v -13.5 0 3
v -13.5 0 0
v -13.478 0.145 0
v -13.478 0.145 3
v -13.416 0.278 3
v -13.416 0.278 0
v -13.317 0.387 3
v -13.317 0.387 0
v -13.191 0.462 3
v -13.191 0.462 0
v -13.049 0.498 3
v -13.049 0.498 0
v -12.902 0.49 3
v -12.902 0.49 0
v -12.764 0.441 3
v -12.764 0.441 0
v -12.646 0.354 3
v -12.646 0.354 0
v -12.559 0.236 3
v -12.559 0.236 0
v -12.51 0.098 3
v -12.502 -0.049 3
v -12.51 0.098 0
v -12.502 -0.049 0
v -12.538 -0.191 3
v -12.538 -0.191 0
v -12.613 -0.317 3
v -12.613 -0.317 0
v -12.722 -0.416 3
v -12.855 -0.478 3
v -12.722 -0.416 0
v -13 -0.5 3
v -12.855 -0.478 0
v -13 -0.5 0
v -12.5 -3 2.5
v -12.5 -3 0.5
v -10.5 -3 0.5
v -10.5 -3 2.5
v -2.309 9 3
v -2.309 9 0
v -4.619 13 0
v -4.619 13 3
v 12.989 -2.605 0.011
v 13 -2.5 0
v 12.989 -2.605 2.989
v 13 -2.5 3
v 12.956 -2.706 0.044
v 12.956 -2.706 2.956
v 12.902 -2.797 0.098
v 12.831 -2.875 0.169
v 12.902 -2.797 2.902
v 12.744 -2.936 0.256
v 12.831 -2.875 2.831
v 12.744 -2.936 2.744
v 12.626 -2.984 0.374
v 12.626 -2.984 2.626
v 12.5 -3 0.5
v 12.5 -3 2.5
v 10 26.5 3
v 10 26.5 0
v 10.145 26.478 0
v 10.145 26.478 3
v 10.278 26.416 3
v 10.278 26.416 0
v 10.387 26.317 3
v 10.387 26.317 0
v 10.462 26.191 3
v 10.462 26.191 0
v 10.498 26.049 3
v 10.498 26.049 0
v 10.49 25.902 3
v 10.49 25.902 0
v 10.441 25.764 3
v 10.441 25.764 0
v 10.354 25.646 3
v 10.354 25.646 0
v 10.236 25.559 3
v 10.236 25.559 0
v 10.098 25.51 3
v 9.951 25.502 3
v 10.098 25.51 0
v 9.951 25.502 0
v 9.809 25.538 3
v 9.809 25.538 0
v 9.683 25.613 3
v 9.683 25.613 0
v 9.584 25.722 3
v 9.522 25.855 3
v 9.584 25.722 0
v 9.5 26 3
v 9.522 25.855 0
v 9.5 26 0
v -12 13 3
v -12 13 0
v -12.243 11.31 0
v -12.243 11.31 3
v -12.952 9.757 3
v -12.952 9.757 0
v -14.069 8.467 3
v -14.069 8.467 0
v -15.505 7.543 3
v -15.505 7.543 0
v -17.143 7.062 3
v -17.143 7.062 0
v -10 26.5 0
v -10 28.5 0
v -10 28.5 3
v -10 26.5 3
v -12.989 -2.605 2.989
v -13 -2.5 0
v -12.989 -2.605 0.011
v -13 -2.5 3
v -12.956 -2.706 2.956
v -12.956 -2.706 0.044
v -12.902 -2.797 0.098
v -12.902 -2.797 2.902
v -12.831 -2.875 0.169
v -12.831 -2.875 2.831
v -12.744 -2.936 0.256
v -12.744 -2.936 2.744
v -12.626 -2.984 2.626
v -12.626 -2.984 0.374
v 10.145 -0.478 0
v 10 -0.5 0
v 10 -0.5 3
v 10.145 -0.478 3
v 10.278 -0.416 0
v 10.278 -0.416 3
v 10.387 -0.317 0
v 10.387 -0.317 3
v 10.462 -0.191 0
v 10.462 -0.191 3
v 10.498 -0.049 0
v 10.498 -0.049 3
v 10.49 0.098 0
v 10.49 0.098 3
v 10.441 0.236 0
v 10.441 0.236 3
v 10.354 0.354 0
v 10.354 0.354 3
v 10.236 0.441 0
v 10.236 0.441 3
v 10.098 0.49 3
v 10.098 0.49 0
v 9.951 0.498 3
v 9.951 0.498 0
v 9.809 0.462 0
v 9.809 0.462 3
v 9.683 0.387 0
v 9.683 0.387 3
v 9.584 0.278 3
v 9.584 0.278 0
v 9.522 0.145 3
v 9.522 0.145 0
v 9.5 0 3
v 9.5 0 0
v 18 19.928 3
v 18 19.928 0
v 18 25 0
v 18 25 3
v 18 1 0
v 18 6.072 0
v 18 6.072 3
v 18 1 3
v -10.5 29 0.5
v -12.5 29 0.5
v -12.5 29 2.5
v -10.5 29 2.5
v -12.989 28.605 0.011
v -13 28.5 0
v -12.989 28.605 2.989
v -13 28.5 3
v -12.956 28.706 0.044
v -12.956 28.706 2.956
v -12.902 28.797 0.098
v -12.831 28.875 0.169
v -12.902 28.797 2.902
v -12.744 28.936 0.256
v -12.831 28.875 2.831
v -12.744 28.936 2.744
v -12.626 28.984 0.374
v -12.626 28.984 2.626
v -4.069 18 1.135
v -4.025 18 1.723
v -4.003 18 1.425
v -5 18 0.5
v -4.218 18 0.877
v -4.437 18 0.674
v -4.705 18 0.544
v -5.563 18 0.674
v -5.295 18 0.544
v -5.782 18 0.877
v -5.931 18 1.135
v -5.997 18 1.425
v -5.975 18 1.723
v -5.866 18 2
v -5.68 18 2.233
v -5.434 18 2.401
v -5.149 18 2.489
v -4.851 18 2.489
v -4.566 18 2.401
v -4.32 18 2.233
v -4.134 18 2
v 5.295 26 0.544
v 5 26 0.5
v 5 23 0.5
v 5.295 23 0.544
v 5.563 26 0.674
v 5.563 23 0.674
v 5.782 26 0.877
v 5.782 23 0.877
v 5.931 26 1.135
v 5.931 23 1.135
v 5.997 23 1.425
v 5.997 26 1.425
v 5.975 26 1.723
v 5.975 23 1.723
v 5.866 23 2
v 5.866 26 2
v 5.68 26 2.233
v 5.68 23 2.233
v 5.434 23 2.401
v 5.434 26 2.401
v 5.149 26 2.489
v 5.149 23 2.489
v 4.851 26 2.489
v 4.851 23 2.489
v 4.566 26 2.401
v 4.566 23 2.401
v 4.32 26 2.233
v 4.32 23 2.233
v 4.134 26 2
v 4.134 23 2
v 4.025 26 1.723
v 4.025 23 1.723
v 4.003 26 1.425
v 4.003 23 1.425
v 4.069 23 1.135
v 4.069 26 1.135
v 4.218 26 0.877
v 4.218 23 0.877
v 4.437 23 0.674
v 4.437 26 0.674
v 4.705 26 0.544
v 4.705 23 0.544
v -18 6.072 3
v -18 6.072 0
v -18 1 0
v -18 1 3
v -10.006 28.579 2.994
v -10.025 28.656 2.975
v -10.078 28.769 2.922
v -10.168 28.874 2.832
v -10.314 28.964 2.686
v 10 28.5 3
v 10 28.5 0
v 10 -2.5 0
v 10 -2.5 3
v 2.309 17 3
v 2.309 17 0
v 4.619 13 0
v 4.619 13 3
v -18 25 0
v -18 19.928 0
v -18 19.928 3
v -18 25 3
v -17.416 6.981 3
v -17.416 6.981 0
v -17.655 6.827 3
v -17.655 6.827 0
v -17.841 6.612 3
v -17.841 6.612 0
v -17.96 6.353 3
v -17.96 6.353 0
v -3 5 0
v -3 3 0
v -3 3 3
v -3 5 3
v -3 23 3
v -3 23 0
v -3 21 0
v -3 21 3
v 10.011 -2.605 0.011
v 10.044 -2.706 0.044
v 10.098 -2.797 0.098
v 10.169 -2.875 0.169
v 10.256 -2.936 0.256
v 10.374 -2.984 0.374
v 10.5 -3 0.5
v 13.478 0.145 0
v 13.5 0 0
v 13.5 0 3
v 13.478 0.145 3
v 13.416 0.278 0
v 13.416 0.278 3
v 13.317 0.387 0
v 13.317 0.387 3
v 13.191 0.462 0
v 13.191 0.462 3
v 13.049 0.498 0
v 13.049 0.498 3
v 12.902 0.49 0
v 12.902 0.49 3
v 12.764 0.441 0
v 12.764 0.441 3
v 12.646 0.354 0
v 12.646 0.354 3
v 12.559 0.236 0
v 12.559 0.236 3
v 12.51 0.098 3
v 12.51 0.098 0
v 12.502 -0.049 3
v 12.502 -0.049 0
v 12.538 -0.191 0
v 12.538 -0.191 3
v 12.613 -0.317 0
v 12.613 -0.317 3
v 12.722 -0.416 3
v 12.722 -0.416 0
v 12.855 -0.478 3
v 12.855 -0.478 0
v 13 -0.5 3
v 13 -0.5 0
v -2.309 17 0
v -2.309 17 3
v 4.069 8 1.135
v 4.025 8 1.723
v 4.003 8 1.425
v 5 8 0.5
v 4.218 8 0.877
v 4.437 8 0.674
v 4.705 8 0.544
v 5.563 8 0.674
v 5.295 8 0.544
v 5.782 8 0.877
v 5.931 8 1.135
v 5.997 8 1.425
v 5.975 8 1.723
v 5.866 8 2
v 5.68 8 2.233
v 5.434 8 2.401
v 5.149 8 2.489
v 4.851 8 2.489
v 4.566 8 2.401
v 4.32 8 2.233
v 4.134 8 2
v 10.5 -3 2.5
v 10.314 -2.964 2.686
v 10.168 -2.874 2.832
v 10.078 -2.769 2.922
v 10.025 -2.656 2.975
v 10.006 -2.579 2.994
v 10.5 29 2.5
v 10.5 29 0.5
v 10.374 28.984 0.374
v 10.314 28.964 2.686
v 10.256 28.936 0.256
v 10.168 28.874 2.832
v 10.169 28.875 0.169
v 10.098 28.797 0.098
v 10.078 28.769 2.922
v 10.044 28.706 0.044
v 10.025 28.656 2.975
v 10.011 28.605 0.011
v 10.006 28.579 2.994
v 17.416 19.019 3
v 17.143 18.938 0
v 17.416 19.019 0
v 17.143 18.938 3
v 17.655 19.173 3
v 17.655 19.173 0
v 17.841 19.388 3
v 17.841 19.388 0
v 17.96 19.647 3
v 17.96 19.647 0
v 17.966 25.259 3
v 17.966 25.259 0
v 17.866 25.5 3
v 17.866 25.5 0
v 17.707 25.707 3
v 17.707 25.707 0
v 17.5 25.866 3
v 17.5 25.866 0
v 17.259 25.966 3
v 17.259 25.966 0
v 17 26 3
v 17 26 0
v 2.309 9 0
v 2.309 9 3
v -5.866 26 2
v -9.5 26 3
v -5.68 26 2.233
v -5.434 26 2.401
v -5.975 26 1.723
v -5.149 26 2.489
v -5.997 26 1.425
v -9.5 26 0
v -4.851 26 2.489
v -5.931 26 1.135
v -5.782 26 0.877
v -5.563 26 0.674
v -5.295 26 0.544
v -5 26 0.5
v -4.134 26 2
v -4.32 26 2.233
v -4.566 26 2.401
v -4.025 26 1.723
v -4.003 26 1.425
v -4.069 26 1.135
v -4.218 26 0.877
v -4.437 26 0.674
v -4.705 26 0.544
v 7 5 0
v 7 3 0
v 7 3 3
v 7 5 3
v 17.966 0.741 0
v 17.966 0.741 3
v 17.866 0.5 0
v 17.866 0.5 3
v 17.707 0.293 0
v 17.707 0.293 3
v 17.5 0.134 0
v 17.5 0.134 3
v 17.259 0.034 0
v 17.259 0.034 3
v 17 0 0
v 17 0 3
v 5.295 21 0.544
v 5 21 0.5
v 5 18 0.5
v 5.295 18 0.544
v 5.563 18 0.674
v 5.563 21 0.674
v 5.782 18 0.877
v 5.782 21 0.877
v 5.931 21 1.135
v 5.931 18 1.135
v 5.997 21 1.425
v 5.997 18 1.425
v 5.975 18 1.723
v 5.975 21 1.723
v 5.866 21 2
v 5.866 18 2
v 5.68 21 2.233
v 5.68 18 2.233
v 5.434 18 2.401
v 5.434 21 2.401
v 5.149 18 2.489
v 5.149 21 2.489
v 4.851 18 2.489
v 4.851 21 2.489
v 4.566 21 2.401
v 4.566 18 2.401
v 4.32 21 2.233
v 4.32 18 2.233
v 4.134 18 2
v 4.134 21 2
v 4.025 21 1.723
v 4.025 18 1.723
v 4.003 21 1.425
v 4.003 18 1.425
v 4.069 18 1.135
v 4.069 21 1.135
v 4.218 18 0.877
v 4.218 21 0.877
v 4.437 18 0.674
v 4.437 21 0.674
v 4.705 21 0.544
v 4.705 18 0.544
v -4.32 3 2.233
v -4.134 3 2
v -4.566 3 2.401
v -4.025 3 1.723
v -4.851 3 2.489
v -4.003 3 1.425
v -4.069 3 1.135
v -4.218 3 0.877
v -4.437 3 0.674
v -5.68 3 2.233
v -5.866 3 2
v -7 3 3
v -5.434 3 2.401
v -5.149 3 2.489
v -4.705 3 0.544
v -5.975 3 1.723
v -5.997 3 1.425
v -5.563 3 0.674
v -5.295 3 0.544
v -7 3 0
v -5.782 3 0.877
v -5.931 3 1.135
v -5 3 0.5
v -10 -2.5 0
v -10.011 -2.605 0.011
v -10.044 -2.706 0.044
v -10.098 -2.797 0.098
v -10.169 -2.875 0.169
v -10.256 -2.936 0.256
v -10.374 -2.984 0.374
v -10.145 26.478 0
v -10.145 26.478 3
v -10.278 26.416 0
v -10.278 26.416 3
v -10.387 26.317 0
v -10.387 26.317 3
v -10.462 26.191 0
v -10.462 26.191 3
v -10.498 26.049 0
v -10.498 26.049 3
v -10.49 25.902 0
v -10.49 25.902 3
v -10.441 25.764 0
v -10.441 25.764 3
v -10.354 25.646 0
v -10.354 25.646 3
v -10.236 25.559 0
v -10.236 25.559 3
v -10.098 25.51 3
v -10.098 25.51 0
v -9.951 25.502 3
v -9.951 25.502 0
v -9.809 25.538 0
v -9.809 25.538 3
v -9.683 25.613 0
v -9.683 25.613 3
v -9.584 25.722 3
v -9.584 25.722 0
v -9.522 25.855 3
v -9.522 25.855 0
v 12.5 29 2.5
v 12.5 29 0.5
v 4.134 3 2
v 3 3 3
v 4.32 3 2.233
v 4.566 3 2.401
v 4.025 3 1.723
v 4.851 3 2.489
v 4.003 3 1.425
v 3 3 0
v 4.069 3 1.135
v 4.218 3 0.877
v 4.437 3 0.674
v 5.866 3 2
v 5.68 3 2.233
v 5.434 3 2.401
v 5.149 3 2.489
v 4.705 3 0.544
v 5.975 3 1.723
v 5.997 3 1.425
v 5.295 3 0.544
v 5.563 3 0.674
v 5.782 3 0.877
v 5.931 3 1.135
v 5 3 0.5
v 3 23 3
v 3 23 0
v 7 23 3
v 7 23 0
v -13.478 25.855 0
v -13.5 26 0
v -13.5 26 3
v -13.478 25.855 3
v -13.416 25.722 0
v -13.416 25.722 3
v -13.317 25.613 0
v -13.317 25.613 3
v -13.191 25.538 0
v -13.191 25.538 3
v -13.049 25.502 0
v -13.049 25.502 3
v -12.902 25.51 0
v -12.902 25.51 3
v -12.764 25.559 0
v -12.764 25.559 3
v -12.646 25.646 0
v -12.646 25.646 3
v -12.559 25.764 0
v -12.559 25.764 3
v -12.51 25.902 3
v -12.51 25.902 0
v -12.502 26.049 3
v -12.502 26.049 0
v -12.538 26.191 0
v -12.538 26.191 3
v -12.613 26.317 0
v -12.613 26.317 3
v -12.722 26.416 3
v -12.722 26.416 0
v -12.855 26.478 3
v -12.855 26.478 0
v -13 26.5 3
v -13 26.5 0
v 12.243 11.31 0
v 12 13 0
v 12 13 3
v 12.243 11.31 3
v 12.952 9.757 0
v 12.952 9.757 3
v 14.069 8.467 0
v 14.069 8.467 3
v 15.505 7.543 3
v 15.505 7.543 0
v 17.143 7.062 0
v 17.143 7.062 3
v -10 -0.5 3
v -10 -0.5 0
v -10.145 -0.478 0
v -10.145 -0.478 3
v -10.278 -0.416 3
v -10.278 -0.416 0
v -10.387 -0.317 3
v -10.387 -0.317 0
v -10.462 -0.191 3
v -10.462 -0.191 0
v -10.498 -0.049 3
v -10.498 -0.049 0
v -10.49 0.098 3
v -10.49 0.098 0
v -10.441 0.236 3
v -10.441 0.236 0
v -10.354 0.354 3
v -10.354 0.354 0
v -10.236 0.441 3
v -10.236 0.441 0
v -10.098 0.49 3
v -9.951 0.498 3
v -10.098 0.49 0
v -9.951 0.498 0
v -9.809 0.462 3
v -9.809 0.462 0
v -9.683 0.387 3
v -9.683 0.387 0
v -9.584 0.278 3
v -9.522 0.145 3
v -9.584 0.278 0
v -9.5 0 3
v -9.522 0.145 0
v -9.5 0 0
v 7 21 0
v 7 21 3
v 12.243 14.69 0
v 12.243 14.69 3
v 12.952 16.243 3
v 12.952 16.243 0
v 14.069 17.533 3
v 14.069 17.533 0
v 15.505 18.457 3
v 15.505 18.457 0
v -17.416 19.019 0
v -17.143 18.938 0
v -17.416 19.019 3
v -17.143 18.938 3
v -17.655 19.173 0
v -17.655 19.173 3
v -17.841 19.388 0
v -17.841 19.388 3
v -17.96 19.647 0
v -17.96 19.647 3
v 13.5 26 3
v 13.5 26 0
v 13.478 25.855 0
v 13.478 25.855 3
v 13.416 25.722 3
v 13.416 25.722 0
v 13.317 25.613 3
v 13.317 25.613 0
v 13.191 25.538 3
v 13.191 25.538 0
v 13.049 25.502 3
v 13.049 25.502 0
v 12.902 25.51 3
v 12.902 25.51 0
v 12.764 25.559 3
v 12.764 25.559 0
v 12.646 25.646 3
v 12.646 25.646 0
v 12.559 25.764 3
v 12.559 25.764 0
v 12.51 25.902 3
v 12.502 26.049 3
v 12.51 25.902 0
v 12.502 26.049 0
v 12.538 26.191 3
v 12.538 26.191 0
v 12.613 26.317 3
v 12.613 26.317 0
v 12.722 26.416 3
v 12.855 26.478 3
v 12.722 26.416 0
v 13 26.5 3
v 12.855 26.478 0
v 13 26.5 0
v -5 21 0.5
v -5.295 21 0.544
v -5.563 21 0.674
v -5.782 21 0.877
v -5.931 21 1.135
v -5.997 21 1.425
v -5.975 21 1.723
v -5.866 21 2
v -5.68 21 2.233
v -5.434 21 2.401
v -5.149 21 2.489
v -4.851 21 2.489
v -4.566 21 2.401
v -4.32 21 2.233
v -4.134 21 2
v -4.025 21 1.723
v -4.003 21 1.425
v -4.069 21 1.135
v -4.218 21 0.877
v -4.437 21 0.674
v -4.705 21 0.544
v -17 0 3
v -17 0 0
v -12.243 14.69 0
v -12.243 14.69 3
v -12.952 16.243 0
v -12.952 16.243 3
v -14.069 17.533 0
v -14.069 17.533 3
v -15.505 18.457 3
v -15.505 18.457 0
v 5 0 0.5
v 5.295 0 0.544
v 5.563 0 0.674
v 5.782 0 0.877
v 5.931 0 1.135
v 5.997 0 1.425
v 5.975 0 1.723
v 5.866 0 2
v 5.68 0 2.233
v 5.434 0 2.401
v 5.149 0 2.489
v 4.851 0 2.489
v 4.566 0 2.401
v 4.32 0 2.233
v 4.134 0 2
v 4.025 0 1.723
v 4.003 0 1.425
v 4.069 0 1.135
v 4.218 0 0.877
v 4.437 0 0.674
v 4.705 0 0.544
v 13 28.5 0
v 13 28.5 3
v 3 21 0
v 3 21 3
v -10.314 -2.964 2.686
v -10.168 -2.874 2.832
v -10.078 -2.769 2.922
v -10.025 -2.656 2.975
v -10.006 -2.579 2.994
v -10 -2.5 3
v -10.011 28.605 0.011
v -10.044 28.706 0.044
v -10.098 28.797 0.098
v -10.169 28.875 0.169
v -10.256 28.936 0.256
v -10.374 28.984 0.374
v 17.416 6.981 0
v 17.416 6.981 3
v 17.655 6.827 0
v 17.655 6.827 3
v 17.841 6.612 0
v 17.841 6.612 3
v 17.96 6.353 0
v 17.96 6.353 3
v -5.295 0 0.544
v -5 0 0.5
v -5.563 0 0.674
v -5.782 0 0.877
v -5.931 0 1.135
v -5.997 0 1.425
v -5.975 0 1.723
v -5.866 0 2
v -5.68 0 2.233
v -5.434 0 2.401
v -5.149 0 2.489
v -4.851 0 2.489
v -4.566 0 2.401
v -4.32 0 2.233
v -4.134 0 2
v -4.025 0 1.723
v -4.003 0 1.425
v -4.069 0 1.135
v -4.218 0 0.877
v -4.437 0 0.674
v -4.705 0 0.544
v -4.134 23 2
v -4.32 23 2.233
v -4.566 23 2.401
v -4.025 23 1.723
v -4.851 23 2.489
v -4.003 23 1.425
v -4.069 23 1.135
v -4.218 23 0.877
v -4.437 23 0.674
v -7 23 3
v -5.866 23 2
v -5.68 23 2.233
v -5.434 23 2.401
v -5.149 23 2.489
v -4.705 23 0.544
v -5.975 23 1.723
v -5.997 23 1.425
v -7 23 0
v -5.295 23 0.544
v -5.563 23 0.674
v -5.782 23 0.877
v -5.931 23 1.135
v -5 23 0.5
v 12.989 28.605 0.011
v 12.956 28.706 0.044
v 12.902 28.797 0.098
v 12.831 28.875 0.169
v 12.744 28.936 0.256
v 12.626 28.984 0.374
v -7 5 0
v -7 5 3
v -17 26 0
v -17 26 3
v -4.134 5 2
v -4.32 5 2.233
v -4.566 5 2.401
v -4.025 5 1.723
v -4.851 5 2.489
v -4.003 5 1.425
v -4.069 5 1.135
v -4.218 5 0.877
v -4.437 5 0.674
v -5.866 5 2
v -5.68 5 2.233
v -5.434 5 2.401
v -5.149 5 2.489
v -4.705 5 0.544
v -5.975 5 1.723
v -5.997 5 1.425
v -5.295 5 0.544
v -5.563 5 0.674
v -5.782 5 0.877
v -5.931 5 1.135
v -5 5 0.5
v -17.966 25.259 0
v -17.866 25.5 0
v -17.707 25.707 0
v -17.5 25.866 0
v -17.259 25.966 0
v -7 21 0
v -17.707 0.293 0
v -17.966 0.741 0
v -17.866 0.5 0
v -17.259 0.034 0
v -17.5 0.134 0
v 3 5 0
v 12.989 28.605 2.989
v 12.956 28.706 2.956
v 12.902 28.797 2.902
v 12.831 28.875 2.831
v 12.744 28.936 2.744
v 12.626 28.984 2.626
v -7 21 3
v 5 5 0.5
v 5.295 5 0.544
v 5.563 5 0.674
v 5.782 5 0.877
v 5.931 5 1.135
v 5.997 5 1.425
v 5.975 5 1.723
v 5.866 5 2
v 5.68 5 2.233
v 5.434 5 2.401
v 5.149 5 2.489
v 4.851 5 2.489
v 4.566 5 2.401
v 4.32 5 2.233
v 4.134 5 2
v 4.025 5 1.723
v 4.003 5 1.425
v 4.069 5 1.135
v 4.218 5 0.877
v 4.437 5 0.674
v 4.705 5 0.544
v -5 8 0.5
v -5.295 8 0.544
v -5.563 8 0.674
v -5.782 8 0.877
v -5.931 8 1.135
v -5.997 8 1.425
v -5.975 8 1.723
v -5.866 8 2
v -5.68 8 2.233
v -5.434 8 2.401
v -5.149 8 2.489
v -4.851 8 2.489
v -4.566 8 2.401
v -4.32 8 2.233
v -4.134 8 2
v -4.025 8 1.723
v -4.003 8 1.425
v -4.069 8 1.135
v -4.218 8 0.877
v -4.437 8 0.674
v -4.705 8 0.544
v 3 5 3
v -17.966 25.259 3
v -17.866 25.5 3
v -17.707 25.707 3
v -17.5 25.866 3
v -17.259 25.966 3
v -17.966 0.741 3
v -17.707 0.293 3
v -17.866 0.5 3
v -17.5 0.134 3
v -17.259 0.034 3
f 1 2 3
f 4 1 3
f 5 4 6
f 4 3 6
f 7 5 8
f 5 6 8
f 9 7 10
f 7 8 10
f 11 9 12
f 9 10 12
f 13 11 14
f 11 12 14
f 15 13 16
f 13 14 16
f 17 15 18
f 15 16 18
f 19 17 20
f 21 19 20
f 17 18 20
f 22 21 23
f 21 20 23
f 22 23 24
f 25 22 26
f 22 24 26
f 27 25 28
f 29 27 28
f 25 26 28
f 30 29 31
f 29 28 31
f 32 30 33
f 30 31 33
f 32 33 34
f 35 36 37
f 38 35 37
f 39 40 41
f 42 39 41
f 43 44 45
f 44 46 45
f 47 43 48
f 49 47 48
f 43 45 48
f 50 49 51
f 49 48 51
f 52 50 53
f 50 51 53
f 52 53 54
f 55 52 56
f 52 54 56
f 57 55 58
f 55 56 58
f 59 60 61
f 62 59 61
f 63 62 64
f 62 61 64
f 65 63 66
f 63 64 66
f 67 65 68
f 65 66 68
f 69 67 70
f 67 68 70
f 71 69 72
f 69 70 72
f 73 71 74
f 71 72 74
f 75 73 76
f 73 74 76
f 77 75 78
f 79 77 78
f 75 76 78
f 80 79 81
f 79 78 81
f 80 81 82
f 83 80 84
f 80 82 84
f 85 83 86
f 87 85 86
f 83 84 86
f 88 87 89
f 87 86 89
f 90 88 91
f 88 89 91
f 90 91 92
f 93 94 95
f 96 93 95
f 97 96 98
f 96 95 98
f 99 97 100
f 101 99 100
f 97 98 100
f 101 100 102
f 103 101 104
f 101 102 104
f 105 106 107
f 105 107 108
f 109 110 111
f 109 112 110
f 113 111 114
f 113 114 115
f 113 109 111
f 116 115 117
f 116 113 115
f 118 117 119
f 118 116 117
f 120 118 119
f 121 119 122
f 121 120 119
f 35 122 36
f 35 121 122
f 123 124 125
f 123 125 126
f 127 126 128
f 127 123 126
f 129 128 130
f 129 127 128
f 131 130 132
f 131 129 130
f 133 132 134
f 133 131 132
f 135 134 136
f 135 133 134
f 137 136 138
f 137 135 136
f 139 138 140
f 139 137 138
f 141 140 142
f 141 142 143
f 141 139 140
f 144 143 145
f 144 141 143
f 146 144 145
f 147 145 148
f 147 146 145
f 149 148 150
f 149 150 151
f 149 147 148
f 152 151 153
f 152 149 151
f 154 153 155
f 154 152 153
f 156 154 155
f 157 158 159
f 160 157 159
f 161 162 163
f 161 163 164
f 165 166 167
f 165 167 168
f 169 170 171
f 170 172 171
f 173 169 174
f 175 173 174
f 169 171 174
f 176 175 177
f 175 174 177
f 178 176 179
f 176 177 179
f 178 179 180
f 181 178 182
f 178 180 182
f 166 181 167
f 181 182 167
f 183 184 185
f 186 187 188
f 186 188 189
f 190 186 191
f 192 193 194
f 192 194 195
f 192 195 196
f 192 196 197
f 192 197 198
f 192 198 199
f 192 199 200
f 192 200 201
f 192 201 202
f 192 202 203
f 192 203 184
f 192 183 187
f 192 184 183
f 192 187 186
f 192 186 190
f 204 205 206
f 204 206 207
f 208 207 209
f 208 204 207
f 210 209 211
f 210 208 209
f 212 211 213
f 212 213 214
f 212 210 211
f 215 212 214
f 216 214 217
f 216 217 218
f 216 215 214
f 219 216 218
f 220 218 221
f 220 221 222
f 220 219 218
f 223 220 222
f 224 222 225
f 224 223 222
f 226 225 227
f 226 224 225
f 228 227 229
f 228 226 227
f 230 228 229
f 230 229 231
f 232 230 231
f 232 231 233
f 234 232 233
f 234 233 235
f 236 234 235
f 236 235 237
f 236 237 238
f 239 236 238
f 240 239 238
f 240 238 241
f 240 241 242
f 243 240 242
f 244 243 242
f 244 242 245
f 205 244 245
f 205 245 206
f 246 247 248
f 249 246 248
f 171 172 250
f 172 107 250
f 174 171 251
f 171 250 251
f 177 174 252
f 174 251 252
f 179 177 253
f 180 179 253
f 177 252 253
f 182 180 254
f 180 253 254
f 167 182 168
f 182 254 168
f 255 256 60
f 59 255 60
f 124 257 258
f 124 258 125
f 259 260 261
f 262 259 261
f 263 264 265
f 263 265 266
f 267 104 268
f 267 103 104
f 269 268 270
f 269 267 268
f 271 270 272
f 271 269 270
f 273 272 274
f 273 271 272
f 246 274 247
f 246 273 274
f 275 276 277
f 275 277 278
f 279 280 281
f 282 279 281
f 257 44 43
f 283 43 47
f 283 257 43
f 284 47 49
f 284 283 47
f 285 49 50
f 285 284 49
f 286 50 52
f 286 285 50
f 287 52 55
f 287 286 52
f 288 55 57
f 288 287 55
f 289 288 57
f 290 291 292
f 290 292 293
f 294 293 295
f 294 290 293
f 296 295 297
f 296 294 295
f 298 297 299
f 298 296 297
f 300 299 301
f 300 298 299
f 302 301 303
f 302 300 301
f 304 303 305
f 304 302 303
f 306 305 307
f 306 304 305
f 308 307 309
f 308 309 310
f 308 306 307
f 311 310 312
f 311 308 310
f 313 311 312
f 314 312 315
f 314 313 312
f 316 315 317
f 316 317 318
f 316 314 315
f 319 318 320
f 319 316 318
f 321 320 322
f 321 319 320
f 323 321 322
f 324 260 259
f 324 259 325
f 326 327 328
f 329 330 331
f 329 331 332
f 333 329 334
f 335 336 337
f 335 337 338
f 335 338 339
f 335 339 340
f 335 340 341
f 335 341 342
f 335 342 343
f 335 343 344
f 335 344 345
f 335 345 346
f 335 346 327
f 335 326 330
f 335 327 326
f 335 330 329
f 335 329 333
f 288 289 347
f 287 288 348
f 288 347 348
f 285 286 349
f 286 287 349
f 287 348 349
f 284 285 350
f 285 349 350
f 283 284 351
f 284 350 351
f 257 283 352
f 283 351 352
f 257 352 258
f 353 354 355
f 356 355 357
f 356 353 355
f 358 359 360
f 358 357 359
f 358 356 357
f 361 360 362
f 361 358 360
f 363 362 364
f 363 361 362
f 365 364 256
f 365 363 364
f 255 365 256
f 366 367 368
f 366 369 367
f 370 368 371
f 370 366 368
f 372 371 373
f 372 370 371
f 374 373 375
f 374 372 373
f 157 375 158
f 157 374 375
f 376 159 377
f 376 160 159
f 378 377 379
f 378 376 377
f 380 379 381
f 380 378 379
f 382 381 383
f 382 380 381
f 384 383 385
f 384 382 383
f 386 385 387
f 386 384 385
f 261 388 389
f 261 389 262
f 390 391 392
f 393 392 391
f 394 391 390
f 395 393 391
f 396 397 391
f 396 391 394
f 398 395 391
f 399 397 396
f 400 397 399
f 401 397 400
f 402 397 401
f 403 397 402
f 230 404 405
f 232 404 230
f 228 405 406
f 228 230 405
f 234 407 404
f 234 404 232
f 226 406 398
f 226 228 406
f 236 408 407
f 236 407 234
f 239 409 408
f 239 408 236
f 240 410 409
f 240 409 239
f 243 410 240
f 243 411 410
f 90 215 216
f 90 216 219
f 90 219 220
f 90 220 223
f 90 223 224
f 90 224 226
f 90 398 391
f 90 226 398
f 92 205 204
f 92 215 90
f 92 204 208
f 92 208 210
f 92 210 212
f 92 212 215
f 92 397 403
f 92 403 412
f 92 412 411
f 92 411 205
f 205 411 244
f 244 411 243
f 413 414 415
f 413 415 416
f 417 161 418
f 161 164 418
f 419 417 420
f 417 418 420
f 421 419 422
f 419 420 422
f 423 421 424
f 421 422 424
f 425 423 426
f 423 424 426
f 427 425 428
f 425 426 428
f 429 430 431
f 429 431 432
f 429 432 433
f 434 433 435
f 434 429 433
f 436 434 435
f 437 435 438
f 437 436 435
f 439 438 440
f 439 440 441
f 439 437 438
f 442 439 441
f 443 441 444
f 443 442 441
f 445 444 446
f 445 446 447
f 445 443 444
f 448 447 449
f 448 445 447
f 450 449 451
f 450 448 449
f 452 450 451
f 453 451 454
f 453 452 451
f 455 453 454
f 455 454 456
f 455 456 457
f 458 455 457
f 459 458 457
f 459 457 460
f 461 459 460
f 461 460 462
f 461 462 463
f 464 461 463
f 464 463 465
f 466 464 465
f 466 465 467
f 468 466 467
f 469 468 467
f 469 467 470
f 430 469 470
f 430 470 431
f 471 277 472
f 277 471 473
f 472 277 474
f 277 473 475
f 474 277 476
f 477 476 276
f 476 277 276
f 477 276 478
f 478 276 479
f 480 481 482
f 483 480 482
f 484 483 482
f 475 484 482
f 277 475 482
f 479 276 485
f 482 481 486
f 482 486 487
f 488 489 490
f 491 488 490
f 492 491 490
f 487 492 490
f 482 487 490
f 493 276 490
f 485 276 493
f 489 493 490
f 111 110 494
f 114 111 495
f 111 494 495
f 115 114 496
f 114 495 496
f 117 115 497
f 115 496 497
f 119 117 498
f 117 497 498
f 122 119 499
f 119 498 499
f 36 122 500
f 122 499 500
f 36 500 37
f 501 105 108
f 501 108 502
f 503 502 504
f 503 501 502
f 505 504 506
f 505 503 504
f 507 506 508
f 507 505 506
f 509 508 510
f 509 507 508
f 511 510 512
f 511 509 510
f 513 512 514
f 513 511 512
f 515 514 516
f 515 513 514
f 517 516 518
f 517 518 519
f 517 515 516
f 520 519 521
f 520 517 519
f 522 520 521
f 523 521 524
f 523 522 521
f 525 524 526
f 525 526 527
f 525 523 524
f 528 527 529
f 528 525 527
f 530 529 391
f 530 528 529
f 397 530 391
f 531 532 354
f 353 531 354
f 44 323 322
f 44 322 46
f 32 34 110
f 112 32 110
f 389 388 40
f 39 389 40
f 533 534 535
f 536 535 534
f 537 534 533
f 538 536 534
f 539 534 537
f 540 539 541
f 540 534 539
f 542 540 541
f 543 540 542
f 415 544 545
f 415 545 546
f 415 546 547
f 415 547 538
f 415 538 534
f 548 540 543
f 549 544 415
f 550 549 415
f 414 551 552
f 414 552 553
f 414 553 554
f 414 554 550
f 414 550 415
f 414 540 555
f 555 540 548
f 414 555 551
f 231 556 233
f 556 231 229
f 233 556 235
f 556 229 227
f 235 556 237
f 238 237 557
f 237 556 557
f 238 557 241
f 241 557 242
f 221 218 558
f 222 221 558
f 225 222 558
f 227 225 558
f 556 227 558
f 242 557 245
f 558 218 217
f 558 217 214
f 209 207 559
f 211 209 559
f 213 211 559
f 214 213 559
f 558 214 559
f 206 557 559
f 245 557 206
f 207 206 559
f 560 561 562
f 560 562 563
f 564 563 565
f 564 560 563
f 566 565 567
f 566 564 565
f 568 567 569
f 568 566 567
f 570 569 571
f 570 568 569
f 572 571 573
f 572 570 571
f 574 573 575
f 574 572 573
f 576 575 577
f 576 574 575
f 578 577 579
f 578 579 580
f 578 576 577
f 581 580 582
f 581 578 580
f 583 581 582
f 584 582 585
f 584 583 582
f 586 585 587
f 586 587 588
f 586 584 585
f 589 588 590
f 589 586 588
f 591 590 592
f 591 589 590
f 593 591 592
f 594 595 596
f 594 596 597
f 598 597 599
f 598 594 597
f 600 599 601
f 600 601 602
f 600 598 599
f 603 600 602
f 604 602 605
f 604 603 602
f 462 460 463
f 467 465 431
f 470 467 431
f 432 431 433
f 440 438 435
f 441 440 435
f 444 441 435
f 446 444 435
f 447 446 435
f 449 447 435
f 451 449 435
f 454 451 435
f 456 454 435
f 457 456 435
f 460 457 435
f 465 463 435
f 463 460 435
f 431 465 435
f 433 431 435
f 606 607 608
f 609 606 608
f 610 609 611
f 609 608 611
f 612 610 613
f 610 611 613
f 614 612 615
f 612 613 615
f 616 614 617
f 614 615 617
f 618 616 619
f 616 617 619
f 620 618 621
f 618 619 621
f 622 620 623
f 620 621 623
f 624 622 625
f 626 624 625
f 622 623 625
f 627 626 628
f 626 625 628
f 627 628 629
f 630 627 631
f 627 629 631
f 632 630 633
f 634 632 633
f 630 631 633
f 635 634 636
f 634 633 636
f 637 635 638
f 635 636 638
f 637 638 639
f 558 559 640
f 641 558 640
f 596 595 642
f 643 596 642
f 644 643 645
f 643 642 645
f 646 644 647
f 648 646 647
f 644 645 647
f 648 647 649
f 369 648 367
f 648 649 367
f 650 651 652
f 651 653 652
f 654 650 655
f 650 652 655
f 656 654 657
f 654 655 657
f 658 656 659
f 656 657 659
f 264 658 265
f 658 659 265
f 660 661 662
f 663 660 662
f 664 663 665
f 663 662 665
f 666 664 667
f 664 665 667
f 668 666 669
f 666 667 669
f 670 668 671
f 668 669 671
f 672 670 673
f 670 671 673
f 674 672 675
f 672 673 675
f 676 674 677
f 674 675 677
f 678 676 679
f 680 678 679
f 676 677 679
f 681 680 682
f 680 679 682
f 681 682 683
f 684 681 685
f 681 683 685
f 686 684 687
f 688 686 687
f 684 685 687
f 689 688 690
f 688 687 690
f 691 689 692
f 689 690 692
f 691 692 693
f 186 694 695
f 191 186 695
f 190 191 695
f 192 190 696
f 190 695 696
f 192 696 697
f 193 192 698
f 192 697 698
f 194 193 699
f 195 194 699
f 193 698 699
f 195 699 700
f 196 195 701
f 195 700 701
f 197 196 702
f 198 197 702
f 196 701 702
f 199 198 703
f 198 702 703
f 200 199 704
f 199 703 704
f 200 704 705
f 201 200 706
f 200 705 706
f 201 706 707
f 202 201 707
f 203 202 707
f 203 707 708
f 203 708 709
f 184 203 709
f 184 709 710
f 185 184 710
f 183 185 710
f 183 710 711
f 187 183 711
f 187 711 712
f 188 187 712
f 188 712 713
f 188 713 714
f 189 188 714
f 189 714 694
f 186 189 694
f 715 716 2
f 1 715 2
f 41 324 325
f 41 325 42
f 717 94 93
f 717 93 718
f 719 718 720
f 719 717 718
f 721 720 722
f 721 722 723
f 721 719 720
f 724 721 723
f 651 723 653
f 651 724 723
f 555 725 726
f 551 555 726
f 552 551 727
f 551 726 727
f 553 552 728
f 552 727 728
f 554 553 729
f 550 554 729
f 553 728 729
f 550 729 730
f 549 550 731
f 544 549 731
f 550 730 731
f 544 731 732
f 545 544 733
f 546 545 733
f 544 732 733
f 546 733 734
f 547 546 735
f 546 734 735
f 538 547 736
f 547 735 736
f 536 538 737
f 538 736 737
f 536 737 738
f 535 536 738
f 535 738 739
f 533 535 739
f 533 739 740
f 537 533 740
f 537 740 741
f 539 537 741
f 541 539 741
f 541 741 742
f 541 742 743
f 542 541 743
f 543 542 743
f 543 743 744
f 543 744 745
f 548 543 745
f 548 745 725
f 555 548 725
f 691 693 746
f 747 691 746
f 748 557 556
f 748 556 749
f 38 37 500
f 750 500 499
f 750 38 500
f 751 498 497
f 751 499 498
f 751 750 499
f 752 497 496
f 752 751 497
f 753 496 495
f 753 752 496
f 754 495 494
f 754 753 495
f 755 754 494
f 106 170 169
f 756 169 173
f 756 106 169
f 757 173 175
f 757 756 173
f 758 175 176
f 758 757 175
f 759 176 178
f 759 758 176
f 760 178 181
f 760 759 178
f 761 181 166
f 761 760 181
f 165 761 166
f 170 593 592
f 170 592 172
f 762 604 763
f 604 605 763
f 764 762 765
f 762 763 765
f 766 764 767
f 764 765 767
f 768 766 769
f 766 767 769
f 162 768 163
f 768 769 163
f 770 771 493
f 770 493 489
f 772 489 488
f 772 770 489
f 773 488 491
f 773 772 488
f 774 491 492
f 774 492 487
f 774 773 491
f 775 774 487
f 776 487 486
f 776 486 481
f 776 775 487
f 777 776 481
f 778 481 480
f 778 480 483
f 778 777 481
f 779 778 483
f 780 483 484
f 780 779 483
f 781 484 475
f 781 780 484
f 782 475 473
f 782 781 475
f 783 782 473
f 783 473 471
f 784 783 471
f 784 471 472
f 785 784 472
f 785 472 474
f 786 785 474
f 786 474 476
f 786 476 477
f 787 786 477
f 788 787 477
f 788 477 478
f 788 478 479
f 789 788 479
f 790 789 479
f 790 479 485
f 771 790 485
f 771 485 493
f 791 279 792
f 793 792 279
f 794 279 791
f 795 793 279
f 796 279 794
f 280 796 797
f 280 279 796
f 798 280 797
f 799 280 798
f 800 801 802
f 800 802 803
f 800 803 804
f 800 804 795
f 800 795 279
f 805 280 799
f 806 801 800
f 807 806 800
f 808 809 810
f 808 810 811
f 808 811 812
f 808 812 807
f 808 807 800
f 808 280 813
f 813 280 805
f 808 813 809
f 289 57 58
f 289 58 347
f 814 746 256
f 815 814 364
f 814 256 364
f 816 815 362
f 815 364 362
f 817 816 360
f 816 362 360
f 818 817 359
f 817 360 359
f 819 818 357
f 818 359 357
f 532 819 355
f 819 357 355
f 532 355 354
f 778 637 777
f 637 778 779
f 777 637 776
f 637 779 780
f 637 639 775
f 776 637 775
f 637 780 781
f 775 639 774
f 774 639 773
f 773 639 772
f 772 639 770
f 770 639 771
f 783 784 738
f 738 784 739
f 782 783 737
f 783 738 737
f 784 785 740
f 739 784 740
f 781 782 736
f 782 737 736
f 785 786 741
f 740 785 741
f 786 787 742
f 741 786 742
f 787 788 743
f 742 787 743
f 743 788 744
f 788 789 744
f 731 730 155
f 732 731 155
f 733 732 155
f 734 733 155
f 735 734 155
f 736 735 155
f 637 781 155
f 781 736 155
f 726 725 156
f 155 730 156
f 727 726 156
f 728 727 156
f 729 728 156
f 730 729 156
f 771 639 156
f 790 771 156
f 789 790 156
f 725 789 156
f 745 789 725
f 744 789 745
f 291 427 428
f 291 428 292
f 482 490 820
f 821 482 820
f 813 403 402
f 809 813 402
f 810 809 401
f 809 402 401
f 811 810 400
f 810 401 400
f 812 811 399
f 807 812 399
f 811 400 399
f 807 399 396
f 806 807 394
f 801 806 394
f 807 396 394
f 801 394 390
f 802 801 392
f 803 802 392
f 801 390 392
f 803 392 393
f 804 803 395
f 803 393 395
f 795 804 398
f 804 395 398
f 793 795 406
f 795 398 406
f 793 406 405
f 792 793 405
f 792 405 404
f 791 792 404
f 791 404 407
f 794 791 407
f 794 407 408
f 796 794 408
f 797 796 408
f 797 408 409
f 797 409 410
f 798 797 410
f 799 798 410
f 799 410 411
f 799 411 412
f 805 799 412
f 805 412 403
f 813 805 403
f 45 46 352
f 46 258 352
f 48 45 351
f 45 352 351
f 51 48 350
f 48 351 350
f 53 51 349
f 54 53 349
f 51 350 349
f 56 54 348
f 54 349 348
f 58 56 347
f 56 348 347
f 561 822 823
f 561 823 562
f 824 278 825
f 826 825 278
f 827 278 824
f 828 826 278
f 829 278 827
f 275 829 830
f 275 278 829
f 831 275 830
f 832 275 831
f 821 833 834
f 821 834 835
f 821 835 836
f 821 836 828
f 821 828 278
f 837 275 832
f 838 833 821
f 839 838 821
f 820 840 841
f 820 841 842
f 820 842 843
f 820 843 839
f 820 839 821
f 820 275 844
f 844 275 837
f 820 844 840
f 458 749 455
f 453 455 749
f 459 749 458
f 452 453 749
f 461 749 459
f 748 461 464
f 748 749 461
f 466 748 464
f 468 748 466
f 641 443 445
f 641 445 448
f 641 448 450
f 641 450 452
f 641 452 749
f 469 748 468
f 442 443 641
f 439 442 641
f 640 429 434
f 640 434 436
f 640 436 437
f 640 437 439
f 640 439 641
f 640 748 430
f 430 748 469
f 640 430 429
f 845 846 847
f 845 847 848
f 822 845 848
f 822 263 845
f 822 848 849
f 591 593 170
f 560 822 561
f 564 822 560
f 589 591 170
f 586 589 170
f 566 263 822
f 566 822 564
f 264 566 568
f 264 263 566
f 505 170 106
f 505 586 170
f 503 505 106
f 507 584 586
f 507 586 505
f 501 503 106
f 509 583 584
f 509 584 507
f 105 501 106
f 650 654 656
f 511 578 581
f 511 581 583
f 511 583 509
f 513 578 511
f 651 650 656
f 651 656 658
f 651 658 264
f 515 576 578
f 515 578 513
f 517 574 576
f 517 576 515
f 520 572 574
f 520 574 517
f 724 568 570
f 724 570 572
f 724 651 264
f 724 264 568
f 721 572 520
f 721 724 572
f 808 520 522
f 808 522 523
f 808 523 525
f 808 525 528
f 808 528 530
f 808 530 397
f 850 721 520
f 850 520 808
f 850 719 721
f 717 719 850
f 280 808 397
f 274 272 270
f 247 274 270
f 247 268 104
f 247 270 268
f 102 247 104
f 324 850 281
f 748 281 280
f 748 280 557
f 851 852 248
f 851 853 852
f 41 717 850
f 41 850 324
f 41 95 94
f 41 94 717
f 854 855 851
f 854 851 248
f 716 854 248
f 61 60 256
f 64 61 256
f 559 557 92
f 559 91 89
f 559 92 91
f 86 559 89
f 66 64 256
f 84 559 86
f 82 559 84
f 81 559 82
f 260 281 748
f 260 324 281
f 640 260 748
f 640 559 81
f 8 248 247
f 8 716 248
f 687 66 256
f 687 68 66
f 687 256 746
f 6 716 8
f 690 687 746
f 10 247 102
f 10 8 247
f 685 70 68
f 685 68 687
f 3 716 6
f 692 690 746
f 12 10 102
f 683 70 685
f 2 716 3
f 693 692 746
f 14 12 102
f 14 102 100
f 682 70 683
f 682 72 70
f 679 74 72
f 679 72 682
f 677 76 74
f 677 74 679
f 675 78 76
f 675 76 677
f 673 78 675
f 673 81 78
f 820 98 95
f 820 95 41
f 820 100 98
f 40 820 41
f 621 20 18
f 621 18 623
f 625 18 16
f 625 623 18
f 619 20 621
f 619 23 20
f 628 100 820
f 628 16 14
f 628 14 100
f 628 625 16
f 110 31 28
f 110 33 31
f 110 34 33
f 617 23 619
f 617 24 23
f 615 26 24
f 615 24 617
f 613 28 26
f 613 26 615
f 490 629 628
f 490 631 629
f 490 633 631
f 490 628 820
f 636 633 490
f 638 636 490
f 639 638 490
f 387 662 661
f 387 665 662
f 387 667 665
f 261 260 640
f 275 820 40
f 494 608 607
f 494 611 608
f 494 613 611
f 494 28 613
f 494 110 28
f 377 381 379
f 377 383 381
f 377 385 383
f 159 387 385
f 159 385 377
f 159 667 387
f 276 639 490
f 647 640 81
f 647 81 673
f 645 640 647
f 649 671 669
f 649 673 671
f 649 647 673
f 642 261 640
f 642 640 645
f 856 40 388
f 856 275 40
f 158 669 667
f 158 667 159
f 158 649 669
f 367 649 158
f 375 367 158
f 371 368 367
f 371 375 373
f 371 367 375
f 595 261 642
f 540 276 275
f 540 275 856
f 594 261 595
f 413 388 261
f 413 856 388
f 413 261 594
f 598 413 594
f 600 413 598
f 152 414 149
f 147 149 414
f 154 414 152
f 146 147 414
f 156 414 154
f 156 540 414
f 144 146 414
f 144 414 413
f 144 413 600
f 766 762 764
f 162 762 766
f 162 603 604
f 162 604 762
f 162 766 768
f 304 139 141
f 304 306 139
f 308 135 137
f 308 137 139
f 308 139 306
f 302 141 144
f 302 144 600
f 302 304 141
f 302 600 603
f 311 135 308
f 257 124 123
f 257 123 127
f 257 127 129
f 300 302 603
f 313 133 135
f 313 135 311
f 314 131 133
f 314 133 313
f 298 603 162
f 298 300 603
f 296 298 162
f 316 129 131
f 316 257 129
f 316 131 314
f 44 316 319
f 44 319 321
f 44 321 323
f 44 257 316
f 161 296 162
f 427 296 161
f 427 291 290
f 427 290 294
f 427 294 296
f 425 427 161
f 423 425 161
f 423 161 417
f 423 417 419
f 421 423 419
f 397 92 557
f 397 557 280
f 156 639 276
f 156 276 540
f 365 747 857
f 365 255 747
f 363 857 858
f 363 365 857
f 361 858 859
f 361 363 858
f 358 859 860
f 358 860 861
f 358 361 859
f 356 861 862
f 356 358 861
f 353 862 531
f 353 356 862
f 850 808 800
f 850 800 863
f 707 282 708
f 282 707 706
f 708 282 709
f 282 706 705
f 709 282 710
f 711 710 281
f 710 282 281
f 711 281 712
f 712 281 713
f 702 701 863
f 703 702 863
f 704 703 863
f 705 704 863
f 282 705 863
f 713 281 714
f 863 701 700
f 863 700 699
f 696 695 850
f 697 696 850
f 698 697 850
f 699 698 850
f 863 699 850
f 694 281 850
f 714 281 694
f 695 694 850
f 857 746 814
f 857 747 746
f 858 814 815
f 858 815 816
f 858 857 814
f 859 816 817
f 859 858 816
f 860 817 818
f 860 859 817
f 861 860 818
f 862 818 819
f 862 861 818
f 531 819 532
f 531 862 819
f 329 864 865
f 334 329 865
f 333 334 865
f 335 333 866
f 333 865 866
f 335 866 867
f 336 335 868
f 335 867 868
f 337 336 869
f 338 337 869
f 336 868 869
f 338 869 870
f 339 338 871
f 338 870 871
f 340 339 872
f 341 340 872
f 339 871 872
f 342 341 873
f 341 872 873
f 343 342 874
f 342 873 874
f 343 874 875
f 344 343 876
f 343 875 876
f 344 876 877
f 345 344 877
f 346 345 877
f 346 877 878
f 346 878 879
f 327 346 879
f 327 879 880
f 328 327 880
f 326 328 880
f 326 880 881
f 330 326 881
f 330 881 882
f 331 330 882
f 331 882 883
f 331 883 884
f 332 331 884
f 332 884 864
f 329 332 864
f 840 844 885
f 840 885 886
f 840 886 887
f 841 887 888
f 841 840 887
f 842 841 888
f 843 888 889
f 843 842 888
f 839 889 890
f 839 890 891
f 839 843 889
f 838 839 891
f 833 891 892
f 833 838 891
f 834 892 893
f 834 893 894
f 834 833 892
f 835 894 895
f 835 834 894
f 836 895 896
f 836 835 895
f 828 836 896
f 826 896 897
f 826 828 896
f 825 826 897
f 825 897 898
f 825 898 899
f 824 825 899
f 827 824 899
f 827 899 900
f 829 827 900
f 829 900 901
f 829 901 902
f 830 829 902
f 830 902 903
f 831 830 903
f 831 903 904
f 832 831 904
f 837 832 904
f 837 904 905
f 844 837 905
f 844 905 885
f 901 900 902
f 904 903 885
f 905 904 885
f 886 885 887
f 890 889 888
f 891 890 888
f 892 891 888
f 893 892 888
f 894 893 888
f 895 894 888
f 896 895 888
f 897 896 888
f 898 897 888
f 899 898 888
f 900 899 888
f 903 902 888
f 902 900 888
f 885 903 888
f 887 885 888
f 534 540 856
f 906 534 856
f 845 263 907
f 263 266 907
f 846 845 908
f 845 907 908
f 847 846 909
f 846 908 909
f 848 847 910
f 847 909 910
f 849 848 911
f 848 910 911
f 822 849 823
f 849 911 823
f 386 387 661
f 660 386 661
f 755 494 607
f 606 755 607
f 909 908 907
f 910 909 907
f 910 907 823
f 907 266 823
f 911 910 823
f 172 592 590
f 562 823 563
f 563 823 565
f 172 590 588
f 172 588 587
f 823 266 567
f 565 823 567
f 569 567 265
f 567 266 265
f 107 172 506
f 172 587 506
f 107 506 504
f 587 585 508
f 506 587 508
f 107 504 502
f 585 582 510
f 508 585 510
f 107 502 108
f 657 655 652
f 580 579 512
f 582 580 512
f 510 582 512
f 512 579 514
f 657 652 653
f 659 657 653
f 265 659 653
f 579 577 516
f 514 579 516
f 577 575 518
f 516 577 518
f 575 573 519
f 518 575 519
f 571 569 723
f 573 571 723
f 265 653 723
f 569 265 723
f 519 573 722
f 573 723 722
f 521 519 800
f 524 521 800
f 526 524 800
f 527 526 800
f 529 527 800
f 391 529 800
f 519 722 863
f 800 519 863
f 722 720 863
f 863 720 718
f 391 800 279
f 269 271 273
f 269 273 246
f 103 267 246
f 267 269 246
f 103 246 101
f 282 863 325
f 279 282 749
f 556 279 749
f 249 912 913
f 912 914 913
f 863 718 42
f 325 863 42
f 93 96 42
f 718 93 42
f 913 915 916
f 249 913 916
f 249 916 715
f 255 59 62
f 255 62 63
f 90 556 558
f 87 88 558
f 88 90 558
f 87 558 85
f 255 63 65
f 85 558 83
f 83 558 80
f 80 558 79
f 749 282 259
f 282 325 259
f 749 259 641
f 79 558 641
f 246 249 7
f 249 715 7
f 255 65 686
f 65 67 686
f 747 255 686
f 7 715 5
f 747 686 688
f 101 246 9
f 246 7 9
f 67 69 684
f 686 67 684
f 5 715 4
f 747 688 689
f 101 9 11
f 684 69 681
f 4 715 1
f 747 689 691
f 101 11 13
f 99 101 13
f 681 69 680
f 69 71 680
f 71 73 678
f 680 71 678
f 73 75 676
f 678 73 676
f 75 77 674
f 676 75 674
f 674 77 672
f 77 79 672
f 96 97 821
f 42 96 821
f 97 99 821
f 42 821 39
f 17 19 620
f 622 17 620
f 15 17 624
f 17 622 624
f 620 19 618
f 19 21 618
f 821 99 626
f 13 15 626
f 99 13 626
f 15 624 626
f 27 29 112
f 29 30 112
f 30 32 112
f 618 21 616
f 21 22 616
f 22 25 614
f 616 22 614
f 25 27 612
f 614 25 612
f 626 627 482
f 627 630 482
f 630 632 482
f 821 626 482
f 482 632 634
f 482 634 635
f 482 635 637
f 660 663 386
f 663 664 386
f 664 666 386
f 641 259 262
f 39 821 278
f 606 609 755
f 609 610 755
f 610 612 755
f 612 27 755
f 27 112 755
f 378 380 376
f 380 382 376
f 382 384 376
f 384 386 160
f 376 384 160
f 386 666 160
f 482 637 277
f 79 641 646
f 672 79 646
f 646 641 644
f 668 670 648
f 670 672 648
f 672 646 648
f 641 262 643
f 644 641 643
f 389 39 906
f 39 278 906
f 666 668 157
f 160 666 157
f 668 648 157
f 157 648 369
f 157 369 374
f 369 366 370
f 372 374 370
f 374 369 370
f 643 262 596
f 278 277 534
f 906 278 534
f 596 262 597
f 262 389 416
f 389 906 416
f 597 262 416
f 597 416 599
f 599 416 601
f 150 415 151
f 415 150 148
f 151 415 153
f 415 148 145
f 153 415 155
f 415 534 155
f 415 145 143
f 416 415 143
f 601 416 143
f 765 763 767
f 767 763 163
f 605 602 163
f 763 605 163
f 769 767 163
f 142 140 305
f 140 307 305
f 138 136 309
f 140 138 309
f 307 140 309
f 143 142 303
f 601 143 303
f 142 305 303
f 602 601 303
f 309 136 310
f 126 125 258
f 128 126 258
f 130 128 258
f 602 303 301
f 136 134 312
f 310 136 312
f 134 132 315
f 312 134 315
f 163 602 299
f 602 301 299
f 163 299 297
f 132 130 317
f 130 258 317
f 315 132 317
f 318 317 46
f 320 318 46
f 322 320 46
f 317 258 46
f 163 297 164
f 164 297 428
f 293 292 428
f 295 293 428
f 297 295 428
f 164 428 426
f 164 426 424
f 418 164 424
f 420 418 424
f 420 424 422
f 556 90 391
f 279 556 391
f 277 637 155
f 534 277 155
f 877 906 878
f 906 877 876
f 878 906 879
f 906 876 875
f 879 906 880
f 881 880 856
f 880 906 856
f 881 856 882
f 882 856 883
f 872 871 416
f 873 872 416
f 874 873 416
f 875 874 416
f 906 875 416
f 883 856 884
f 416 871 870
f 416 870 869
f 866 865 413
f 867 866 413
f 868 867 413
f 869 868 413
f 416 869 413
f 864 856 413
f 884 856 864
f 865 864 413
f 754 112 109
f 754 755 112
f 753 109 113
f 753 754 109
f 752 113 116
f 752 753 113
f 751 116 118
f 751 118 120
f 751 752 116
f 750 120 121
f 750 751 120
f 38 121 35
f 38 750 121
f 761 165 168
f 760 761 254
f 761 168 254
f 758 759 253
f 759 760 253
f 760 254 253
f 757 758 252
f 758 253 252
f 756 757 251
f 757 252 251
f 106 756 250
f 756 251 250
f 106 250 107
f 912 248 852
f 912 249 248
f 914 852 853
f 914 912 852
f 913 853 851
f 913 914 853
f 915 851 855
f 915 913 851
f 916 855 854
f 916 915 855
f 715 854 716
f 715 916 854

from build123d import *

# Parameters (mm, degrees)
SKETCH1_W           = 4
SKETCH1_H           = 2
BOSS_EXTRUDE1_DEPTH = 3
SKETCH2_R           = 1
CUT_EXTRUDE1_DEPTH  = 8
FILLET1_R           = 1
FILLET2_R           = 0.5


with BuildPart() as part:
    # Sketch1 → Boss-Extrude1 (new body)
    with BuildSketch(Plane.XY):
        with BuildLine():
            ThreePointArc((12, 13), (13.757359313, 8.757359313), (18, 7))
            Line((18, 7), (18, 0))
            Line((18, 0), (13.5, 0))
            ThreePointArc((13.5, 0), (12.646446609, 0.353553391), (13, -0.5))
            Line((13, -0.5), (13, -3))
            Line((13, -3), (10, -3))
            Line((10, -3), (10, -0.5))
            ThreePointArc((10, -0.5), (10.353553391, 0.353553391), (9.5, 0))
            Line((9.5, 0), (0, 0))
            Line((0, 0), (0, 9))
            Line((0, 9), (2.309401077, 9))
            Line((2.309401077, 9), (4.618802154, 13))
            Line((4.618802154, 13), (12, 13))
        make_face()
        with Locations((5, 4)):
            Rectangle(SKETCH1_W, SKETCH1_H, mode=Mode.SUBTRACT)
    extrude(amount=BOSS_EXTRUDE1_DEPTH)

    # Sketch2 → Cut-Extrude1 (cut)
    with BuildSketch(Plane.XZ):
        with Locations(Location((5, 1.5, 0), (0, 0, 270))):
            Circle(SKETCH2_R)
    extrude(amount=-CUT_EXTRUDE1_DEPTH, mode=Mode.SUBTRACT)

    # Fillet1
    fillet1_edges = [part.edges().sort_by_distance(p)[0] for p in [
        (18, 7, 1.5),
        (18, 0, 1.5),
    ]]
    fillet(fillet1_edges, radius=FILLET1_R)

    # Fillet2
    fillet2_edges = [part.edges().sort_by_distance(p)[0] for p in [
        (11.5, -3, 0),
        (13, -3, 1.5),
        (10, -3, 1.5),
        (11.5, -3, 3),
    ]]
    fillet(fillet2_edges, radius=FILLET2_R)

    # Mirror1: part across plane


with BuildPart() as part_1:
    add(part.part)
    add(part.part.mirror(Plane(origin=(0, 0, 3), x_dir=(0, 0, 1), z_dir=(-1, 0, 0))))

    # Mirror2: part across plane


with BuildPart() as part_2:
    add(part_1.part)
    add(part_1.part.mirror(Plane(origin=(0, 13, 3), x_dir=(0, 0, 1), z_dir=(0, 1, 0))))


solid = part_2.part
